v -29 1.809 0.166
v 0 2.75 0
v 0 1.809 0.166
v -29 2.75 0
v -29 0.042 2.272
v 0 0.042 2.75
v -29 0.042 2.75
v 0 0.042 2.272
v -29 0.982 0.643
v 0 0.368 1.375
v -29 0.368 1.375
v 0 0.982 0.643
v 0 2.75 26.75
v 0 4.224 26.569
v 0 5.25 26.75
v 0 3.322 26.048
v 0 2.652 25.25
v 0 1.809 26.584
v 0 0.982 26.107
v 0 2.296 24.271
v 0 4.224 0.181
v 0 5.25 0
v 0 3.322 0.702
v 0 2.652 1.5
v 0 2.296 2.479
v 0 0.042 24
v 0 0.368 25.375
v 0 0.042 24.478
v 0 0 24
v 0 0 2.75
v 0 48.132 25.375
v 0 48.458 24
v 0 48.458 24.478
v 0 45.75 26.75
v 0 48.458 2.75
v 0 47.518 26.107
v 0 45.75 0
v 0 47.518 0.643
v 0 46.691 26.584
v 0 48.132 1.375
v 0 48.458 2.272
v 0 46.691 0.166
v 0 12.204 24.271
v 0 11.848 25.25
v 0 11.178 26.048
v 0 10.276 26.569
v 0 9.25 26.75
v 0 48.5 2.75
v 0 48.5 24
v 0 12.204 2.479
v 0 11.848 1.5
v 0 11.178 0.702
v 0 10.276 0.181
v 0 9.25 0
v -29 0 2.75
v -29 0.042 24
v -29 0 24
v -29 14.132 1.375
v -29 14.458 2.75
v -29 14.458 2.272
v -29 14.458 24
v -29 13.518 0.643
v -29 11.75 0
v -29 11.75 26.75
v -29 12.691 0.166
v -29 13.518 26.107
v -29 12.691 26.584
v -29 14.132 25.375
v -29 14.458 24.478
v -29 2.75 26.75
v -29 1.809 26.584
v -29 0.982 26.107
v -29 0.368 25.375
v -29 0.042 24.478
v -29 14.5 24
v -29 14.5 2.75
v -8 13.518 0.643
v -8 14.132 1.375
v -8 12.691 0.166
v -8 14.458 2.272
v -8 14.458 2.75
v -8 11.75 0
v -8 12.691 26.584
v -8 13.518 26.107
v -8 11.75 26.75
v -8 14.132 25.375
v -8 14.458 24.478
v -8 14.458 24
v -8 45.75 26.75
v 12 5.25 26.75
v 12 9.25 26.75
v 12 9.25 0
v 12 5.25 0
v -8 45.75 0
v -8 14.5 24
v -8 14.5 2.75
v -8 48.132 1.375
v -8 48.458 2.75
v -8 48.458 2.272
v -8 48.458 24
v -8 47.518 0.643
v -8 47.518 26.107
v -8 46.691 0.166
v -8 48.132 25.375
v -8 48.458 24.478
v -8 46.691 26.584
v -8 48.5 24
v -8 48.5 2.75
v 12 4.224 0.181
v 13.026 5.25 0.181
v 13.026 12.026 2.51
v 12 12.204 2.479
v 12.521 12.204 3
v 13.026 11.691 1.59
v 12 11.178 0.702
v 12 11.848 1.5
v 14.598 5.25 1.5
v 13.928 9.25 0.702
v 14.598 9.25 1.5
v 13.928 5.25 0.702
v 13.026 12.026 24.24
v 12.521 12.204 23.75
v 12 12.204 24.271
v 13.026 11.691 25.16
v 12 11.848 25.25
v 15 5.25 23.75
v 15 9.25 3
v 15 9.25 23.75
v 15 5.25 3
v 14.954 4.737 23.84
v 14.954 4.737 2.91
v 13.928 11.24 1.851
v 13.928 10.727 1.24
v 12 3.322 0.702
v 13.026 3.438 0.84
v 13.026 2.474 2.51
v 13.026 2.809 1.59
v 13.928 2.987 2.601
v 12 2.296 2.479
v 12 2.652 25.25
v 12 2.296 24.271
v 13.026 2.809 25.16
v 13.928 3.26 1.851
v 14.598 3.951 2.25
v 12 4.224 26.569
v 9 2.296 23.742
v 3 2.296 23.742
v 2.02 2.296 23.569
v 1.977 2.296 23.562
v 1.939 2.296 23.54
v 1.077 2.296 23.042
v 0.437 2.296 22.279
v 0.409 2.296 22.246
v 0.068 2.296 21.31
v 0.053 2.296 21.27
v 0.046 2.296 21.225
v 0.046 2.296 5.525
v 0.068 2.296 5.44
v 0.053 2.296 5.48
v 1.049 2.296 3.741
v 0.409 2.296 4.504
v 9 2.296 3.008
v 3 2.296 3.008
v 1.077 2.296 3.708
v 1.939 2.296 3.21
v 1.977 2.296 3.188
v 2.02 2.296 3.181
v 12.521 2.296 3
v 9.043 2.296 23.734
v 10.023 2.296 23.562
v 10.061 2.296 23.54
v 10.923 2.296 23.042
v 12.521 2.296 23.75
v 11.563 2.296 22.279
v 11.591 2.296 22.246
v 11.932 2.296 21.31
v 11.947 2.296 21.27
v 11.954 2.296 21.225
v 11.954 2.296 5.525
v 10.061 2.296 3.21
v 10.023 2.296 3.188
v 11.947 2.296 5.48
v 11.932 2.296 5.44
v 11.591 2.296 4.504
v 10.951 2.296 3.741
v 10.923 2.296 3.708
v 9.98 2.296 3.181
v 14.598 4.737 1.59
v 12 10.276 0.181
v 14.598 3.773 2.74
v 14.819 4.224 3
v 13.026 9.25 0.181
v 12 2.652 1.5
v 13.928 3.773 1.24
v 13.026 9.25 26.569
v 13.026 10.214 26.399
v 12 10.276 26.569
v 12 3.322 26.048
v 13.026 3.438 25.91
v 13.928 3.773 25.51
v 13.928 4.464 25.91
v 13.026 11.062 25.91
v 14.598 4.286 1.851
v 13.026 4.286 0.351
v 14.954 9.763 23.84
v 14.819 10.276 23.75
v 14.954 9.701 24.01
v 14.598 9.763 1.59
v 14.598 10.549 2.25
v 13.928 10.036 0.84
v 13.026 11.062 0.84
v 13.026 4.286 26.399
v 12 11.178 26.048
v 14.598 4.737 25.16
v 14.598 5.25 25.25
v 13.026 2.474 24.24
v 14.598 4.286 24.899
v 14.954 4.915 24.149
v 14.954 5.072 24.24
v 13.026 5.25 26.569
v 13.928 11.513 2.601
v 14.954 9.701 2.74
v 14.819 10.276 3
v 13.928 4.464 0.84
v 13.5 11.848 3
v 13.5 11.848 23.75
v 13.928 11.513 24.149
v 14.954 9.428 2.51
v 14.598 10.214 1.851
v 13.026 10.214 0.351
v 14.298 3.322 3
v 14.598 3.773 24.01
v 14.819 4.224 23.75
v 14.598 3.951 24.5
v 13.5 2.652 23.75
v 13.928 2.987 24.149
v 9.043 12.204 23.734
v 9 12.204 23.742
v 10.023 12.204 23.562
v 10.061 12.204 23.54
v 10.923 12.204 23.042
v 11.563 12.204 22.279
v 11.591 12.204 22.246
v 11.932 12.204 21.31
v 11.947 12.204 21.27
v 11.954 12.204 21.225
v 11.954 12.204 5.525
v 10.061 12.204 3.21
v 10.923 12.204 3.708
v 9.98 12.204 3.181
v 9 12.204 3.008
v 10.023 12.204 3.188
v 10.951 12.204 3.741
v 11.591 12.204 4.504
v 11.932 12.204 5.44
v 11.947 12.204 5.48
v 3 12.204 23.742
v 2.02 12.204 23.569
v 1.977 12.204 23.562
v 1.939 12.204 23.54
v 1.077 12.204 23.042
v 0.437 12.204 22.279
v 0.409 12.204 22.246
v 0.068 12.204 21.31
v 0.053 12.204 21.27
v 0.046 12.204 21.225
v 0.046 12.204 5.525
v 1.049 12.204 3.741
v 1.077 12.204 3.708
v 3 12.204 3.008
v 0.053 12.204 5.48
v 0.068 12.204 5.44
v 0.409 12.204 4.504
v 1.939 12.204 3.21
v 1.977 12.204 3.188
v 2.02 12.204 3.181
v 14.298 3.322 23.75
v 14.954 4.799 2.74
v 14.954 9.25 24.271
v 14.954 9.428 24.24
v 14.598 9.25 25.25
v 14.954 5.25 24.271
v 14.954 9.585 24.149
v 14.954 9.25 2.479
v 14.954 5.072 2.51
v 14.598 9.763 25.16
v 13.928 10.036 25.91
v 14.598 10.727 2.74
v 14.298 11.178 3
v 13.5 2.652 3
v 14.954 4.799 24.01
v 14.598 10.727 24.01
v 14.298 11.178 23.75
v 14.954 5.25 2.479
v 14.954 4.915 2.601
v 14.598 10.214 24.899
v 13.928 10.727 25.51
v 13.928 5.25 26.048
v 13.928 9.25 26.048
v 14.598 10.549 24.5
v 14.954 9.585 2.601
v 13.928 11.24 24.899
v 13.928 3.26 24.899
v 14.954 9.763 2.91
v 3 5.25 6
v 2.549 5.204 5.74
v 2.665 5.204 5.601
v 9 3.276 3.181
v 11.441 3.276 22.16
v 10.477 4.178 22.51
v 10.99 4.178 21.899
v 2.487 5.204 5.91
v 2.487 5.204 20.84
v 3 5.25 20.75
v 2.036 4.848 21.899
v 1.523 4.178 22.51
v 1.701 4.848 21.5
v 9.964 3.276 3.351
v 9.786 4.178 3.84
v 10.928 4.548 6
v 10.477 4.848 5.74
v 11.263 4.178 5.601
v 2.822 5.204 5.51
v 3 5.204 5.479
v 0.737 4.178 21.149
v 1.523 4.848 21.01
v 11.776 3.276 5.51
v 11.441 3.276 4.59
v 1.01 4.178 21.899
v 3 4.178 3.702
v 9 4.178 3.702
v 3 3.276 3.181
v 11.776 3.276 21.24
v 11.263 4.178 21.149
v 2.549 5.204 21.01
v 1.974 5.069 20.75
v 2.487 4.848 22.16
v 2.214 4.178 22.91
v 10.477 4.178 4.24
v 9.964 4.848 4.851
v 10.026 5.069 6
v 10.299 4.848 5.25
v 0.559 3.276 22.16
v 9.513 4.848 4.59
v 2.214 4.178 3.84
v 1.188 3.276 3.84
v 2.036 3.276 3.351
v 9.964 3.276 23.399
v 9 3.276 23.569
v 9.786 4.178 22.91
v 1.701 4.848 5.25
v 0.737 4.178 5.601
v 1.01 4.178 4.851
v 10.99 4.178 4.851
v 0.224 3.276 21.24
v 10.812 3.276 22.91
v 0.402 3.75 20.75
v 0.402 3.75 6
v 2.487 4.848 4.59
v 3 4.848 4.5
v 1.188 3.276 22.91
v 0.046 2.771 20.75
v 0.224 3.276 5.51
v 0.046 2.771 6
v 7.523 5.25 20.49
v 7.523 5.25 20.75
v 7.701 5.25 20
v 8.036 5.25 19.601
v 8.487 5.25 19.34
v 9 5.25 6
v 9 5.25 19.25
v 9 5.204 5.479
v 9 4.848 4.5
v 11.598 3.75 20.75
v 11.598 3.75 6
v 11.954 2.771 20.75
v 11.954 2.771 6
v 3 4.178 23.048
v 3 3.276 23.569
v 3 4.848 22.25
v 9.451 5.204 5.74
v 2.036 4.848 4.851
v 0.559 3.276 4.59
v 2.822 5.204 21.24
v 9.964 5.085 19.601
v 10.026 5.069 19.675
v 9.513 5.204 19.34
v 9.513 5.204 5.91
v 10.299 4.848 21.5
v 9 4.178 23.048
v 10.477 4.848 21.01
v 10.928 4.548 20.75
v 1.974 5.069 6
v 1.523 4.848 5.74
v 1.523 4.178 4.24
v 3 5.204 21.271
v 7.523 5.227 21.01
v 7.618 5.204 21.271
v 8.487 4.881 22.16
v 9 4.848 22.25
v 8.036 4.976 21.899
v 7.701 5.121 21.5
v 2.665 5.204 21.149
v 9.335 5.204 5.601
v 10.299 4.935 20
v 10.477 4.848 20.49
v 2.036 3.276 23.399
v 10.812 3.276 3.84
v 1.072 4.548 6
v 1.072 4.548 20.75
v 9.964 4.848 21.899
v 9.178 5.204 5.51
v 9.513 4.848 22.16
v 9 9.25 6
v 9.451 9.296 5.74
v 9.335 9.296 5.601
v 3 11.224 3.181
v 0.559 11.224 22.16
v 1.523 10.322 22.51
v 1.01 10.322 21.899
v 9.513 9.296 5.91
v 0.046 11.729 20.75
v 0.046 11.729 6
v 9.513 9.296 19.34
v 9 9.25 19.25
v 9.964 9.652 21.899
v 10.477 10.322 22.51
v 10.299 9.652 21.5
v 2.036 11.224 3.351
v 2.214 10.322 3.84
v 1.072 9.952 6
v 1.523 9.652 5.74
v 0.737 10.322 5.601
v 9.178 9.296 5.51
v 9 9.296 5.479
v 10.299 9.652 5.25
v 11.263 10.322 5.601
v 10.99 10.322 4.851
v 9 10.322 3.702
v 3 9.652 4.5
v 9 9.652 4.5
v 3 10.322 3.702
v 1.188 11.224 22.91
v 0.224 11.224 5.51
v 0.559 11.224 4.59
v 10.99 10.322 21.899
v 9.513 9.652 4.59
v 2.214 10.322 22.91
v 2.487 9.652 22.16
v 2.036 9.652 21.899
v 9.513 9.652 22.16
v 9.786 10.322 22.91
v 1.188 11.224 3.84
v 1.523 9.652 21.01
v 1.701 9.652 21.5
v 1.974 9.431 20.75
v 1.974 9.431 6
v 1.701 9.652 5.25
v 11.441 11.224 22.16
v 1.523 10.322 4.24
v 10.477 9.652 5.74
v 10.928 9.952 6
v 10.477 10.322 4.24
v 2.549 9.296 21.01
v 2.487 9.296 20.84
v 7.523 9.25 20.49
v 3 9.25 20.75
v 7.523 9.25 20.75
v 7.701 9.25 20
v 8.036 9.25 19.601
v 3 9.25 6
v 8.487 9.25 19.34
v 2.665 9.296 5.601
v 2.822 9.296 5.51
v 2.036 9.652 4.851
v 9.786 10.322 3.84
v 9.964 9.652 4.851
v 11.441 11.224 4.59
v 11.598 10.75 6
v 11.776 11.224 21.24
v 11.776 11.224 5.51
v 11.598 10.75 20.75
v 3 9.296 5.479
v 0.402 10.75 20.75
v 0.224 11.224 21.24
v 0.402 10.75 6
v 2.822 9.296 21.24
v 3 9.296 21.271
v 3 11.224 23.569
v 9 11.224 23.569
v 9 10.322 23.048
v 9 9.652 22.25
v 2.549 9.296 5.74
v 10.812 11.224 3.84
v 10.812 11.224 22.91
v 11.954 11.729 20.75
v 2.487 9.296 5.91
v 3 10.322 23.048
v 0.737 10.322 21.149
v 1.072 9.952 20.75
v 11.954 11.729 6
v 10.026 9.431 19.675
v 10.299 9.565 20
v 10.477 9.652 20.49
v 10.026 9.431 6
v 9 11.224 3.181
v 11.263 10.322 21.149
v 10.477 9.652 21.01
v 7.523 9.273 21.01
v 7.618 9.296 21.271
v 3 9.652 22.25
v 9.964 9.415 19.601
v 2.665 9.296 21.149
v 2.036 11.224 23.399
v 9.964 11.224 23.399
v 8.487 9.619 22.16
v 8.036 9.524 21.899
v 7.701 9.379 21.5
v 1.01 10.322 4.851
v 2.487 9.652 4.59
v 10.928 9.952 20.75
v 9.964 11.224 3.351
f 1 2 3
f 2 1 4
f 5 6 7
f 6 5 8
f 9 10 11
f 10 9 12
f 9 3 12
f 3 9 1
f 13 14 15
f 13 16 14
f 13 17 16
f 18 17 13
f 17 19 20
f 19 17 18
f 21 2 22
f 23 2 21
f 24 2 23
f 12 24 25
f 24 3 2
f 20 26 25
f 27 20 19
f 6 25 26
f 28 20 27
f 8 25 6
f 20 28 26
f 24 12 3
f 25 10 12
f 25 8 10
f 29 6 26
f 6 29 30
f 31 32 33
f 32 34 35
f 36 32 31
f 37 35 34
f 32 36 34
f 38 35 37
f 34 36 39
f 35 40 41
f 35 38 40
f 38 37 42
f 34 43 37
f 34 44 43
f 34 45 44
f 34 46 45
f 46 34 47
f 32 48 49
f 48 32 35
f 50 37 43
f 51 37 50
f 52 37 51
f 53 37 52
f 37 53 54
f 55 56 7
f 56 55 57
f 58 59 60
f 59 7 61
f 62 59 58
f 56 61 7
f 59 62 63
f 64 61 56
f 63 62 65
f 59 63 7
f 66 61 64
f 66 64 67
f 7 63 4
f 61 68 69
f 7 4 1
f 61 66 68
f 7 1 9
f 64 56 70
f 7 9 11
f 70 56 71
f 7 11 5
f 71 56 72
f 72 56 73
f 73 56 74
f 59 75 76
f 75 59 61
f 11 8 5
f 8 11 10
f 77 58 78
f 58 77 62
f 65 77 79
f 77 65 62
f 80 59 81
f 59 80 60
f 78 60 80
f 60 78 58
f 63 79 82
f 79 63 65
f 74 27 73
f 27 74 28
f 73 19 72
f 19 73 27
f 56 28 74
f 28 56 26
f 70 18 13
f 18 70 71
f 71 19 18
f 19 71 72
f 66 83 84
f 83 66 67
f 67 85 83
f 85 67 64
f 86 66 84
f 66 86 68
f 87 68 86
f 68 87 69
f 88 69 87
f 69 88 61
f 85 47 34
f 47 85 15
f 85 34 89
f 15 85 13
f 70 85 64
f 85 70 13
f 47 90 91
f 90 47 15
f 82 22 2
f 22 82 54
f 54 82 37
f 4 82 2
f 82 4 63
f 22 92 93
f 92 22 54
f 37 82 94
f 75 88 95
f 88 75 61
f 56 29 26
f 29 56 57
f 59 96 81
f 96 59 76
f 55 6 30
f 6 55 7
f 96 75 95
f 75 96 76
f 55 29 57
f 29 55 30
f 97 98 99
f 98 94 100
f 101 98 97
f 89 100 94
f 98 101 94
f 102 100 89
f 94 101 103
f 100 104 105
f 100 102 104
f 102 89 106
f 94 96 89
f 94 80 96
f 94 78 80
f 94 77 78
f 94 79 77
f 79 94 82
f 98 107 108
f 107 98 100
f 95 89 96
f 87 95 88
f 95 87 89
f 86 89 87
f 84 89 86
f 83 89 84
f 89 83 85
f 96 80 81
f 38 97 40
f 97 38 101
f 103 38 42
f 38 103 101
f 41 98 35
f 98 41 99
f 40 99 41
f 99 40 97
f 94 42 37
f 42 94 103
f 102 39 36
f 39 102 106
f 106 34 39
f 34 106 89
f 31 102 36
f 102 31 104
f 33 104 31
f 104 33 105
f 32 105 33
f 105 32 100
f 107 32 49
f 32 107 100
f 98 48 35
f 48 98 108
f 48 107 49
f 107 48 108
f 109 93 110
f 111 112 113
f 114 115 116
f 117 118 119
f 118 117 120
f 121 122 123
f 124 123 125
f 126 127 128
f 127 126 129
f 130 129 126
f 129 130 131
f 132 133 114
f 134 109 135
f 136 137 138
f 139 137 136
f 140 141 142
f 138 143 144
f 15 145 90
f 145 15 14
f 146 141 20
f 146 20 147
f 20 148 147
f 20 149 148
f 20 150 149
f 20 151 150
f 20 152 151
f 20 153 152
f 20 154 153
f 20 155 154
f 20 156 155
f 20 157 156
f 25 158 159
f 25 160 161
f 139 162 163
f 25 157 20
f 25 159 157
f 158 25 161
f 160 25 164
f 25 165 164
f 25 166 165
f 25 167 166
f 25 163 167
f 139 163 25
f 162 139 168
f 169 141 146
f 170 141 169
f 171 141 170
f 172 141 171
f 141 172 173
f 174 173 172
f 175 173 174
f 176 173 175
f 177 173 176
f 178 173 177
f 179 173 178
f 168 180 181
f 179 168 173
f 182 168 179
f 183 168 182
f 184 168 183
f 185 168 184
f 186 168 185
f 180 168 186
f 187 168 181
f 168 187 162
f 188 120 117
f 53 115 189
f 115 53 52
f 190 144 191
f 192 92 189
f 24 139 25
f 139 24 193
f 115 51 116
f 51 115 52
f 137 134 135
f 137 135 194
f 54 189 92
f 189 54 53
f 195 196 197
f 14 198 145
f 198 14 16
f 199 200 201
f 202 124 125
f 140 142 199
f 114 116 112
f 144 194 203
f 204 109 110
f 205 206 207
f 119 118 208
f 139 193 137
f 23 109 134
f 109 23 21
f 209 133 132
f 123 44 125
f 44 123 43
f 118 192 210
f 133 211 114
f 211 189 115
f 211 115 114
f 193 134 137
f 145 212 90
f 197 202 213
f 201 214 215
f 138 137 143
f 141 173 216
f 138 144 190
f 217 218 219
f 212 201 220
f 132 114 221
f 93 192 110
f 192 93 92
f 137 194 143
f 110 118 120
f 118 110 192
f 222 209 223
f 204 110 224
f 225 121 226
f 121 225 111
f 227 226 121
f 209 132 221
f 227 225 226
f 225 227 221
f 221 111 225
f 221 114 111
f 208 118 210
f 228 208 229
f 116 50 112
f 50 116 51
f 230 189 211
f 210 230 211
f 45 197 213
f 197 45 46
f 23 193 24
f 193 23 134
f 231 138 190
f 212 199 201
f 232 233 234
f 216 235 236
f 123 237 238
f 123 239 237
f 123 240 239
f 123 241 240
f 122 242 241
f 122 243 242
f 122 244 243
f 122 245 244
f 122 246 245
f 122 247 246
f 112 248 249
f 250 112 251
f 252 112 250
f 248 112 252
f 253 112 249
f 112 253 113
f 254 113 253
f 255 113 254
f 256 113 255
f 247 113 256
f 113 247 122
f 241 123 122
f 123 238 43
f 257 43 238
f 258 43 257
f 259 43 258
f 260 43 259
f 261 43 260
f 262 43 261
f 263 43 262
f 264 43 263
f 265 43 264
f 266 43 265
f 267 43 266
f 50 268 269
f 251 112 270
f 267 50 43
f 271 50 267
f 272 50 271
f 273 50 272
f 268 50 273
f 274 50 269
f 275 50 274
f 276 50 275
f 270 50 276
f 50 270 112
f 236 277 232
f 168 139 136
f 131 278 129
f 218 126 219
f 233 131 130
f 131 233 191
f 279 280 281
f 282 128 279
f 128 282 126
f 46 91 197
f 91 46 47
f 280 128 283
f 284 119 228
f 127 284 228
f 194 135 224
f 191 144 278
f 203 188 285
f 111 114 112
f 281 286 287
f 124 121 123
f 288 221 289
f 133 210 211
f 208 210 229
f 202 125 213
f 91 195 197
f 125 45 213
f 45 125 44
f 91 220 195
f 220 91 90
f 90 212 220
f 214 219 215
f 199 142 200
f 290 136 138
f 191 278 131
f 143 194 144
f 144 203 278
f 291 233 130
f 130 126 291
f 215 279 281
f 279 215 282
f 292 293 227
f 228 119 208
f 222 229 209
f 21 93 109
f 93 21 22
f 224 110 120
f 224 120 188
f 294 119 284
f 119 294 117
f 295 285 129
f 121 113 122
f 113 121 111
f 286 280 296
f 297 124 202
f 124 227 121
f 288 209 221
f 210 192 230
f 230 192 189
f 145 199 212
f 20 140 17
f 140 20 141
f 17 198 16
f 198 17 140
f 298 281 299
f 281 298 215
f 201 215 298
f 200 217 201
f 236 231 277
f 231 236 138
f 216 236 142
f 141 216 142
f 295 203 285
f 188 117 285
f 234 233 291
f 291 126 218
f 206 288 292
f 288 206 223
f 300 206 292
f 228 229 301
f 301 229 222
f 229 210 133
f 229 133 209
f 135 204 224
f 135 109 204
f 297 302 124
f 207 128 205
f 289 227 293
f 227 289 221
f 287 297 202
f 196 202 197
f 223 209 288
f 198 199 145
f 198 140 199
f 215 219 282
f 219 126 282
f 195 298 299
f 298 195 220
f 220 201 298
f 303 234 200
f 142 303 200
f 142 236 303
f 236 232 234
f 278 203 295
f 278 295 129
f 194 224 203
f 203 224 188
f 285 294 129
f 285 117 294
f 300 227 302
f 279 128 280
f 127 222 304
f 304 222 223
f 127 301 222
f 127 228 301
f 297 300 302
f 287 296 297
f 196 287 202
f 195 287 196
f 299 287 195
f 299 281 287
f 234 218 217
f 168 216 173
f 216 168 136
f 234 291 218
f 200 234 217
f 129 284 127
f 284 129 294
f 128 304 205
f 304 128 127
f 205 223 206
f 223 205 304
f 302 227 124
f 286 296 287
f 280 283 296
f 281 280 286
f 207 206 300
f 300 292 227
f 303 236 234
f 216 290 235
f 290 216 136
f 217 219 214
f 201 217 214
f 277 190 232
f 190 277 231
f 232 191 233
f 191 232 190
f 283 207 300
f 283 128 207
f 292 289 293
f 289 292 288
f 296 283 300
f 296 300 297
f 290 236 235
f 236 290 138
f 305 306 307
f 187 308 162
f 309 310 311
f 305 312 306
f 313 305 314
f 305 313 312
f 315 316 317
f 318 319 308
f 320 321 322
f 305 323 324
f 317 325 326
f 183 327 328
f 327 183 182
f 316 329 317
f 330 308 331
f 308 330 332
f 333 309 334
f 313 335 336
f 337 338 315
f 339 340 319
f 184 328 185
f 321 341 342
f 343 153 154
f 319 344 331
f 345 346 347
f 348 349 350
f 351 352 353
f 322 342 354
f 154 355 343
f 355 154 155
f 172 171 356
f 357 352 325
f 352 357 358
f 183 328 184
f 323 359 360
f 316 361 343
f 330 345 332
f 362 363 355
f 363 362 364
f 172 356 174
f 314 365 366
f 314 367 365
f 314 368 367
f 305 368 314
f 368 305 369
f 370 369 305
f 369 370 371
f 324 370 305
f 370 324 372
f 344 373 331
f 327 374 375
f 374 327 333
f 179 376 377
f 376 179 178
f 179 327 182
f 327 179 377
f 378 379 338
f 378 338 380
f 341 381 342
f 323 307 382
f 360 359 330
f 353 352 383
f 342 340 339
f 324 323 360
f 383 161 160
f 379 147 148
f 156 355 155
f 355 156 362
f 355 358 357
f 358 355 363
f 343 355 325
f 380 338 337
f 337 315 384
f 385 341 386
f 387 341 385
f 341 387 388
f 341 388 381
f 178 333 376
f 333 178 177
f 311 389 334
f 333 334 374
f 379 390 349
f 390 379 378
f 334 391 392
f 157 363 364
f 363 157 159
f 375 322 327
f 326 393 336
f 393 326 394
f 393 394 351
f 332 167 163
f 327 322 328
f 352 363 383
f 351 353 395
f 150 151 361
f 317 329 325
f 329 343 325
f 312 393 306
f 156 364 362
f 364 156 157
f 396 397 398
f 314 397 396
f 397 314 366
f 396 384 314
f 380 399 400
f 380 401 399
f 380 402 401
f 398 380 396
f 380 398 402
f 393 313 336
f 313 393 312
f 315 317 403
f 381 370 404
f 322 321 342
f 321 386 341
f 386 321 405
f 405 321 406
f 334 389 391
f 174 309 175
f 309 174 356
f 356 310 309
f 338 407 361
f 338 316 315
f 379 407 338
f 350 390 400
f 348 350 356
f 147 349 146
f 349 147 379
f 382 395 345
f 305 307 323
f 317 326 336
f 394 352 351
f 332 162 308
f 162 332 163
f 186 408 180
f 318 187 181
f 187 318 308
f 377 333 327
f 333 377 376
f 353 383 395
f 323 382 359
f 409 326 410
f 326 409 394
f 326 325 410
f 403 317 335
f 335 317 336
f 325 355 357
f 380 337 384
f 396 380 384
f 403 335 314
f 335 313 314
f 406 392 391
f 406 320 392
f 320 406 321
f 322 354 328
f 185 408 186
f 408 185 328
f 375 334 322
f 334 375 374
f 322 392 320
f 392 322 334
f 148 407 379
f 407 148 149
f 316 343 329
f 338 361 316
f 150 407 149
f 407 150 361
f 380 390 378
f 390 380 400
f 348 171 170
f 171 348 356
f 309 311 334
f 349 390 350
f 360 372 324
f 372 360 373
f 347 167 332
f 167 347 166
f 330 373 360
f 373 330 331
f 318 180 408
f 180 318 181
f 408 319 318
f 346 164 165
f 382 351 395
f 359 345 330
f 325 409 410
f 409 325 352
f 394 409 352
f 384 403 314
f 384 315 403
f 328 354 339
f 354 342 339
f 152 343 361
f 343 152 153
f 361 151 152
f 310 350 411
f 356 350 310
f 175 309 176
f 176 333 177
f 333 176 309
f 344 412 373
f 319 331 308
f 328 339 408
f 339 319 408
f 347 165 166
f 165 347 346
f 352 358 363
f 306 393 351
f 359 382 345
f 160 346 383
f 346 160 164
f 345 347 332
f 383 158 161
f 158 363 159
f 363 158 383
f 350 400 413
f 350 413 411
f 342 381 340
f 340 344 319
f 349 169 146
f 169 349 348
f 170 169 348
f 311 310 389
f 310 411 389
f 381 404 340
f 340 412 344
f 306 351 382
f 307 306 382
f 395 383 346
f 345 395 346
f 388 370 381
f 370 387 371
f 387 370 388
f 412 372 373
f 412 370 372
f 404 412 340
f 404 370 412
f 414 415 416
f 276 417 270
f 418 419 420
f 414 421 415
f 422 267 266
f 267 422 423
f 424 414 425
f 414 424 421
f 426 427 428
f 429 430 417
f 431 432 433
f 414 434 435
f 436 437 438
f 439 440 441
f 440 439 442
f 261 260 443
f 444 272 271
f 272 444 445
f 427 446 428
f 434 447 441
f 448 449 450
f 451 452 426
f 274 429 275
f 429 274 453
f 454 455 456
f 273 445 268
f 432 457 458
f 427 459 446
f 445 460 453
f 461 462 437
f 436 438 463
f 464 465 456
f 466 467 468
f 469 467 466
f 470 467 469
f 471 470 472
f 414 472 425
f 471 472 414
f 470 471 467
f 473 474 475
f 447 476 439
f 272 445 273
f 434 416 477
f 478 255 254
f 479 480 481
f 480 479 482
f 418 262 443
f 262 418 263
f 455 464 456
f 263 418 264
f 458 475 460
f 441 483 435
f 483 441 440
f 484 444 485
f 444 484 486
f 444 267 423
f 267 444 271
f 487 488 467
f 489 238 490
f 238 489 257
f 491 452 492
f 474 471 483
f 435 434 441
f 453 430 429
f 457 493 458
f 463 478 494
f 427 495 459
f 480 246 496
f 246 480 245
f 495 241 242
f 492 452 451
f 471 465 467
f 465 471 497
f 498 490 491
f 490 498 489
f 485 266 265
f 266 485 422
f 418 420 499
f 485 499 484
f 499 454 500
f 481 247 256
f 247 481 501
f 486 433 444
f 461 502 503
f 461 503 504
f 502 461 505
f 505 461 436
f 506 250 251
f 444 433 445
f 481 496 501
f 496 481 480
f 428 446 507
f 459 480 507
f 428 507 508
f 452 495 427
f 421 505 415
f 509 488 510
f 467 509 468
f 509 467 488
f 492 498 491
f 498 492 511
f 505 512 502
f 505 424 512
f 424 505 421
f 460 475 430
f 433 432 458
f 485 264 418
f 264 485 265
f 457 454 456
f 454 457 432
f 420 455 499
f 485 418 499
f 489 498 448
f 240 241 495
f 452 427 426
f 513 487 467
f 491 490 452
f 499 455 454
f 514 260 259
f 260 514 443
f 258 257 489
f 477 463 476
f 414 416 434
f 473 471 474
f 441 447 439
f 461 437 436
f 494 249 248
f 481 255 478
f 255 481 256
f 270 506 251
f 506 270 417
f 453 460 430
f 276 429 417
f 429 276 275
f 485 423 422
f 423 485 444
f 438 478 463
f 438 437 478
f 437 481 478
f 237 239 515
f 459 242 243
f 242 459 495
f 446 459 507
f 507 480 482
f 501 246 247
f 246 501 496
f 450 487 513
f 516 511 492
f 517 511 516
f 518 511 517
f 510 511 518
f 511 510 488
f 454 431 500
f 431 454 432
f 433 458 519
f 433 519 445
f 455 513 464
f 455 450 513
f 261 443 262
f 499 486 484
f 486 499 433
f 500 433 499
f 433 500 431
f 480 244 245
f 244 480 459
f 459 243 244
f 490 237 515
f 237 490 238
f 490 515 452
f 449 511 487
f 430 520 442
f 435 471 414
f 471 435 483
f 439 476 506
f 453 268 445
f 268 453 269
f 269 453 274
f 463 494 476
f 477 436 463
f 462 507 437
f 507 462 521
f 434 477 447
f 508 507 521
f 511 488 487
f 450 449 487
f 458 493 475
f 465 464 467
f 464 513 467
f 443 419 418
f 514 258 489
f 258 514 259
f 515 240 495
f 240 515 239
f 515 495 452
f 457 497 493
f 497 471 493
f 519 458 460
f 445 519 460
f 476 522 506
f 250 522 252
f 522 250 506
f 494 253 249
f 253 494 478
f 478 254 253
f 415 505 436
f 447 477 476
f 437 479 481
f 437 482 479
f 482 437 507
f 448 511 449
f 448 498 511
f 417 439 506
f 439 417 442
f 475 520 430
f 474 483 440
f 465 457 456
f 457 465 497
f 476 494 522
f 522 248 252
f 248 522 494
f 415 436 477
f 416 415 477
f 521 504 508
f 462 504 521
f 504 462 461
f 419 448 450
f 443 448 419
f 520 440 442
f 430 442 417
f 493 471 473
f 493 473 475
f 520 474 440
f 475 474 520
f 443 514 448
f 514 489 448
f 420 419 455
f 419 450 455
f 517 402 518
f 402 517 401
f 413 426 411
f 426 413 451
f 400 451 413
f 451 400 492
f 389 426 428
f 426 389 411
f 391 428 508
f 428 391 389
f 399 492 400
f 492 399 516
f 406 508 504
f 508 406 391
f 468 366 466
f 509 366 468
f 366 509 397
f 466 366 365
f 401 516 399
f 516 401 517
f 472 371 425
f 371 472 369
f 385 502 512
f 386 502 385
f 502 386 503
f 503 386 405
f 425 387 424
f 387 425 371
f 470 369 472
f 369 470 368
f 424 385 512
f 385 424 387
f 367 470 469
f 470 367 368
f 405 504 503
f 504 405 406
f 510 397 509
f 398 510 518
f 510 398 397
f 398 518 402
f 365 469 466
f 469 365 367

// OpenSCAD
// [FL_INDEX: keywords="openscad, 3d_parametric, Customizable_simple_door_stop__pinch_guard, csg_solid" | COT="Parametric OpenSCAD design from 3DCodeverse"]
// Title: Customizable simple door stop (pinch guard)


// Door bolt hole height; must be a tight fit
bolt_hole_height = 26.75;
// Door bolt hole width; must be a tight fit
bolt_hole_width = 14.5;
// Door bolt hole depth
bolt_hole_depth = 21;

// Door bolt hole corner radius
bolt_hole_corner_radius = 2.75;

// Door stopper tongue length; must be long enough so gap between door and frame is sufficiently large
tongue_length = 34;
// Door stopper tongue thickness; must be thick enough so door is blocked and doesn't slide past tongue
tongue_thickness = 8;

// Pull handle inset (determines handle width = bolt hole width - 2 * inset)
handle_inset = 2.25;
// Pull handle length
handle_length = 15;
// Whether to include a hole (for a strap to hang from door when not inserted) or not
handle_hole = true;


/* [Hidden] */

// Door tongue inset dimensions
h = bolt_hole_height;
w = bolt_hole_width;
d = bolt_hole_depth;

rad = bolt_hole_corner_radius;

// Door parameters
l = tongue_length;
thk = tongue_thickness;

// Handle parameters
h_inset = handle_inset;
h_d = handle_length;
hole_r = 3/2;
hole = handle_hole;

h_w = w - 2*h_inset;  // must be <= w
h_or = 3;  // outer corner rounding radius
h_ir = 3;  // inner rounding radius
h_rim = 3; // finger notch rim

$fn=18;

// ****  FROM lib/util.scad
module roundedCube4(dim, r, center=false) {
  width = dim[0];
  height = dim[1];
  depth = dim[2];
  centerx = (center[0] == undef ? center : center[0]);
  centery = (center[1] == undef ? center : center[1]);
  centerz = (center[2] == undef ? center : center[2]);
  translate([centerx ? -width/2 : 0, centery ? -height/2 : 0, centerz ? -depth/2 : 0]) union() {
    translate([0, r, 0]) cube([width, height-2*r, depth]);
    translate([r, 0, 0]) cube([width-2*r, height, depth]);
    for (xy = [[r, r],
               [r, height-r],
               [width-r, r],
               [width-r, height-r]]) {
      translate([xy[0], xy[1], 0]) cylinder(r = r, h = depth);
    }
  }
}

// TODO FIXME: dim[2] is not obeyed and top is filleted when dim[2] is >r but <2*r, because corner sphere diameter exceeds height  (should be a half-sphere, in principle)
module roundedCube6(dim, r, center=false) {
  width = dim[0];
  height = dim[1];
  depth = dim[2];
  centerx = (center[0] == undef ? center : center[0]);
  centery = (center[1] == undef ? center : center[1]);
  centerz = (center[2] == undef ? center : center[2]);
  translate([r - (centerx ? width/2 : 0), r - (centery ? height/2 : 0), r - (centerz ? depth/2 : 0)]) hull() {
    // Edges
    translate([0, 0, 0]) rotate([-90, 0, 0]) cylinder(h = height-2*r,r = r);
    translate([width-2*r, 0, 0]) rotate([-90, 0, 0]) cylinder(h = height-2*r,r = r);
    translate([0, 0, 0]) rotate([0, 90, 0]) cylinder(h = width-2*r, r = r);
    translate([0, height-2*r, 0]) rotate([0, 90, 0]) cylinder(h = width-2*r, r = r);
    translate([0, 0, 0]) cylinder(h = depth-r, r = r);
    translate([width-2*r, 0, 0]) cylinder(h = depth-r, r = r);
    translate([0, height-2*r, 0]) cylinder(h = depth-r, r = r);
    translate([width-2*r, height-2*r, 0]) cylinder(h = depth-r, r = r);

    // Corners
    translate([0,0,0]) sphere(r);
    translate([width-2*r, 0, 0]) sphere(r);
    translate([0, height-2*r, 0]) sphere(r);
    translate([width-2*r, height-2*r, 0]) sphere(r);
  }
}

//  *****  END FROM lib/util.scad

rotate([0, -90, 0]) union() {
  roundedCube4([h, w, d+thk], r=rad);
  roundedCube4([h, w+l, thk], r=rad);
  translate([0, (w-h_w)/2, -h_d]) difference() {
    roundedCube6([h, h_w, h_d+thk], r=h_or);
    translate([h_rim, h_rim, h_rim]) rotate([90, 0, 0]) roundedCube6([h-2*h_rim, h_d-h_rim, 2*h_rim], r=h_ir);
    translate([h_rim, h_w-h_rim, h_d]) rotate([-90, 0, 0]) roundedCube6([h-2*h_rim, h_d-h_rim, 2*h_rim], r=h_ir);  
    if (hole) {
      translate([h-h_rim-h_ir, -1, h_rim+h_ir]) rotate([-90, 0, 0]) cylinder(r=hole_r, h=h_w+2);
    } 
  }
}
